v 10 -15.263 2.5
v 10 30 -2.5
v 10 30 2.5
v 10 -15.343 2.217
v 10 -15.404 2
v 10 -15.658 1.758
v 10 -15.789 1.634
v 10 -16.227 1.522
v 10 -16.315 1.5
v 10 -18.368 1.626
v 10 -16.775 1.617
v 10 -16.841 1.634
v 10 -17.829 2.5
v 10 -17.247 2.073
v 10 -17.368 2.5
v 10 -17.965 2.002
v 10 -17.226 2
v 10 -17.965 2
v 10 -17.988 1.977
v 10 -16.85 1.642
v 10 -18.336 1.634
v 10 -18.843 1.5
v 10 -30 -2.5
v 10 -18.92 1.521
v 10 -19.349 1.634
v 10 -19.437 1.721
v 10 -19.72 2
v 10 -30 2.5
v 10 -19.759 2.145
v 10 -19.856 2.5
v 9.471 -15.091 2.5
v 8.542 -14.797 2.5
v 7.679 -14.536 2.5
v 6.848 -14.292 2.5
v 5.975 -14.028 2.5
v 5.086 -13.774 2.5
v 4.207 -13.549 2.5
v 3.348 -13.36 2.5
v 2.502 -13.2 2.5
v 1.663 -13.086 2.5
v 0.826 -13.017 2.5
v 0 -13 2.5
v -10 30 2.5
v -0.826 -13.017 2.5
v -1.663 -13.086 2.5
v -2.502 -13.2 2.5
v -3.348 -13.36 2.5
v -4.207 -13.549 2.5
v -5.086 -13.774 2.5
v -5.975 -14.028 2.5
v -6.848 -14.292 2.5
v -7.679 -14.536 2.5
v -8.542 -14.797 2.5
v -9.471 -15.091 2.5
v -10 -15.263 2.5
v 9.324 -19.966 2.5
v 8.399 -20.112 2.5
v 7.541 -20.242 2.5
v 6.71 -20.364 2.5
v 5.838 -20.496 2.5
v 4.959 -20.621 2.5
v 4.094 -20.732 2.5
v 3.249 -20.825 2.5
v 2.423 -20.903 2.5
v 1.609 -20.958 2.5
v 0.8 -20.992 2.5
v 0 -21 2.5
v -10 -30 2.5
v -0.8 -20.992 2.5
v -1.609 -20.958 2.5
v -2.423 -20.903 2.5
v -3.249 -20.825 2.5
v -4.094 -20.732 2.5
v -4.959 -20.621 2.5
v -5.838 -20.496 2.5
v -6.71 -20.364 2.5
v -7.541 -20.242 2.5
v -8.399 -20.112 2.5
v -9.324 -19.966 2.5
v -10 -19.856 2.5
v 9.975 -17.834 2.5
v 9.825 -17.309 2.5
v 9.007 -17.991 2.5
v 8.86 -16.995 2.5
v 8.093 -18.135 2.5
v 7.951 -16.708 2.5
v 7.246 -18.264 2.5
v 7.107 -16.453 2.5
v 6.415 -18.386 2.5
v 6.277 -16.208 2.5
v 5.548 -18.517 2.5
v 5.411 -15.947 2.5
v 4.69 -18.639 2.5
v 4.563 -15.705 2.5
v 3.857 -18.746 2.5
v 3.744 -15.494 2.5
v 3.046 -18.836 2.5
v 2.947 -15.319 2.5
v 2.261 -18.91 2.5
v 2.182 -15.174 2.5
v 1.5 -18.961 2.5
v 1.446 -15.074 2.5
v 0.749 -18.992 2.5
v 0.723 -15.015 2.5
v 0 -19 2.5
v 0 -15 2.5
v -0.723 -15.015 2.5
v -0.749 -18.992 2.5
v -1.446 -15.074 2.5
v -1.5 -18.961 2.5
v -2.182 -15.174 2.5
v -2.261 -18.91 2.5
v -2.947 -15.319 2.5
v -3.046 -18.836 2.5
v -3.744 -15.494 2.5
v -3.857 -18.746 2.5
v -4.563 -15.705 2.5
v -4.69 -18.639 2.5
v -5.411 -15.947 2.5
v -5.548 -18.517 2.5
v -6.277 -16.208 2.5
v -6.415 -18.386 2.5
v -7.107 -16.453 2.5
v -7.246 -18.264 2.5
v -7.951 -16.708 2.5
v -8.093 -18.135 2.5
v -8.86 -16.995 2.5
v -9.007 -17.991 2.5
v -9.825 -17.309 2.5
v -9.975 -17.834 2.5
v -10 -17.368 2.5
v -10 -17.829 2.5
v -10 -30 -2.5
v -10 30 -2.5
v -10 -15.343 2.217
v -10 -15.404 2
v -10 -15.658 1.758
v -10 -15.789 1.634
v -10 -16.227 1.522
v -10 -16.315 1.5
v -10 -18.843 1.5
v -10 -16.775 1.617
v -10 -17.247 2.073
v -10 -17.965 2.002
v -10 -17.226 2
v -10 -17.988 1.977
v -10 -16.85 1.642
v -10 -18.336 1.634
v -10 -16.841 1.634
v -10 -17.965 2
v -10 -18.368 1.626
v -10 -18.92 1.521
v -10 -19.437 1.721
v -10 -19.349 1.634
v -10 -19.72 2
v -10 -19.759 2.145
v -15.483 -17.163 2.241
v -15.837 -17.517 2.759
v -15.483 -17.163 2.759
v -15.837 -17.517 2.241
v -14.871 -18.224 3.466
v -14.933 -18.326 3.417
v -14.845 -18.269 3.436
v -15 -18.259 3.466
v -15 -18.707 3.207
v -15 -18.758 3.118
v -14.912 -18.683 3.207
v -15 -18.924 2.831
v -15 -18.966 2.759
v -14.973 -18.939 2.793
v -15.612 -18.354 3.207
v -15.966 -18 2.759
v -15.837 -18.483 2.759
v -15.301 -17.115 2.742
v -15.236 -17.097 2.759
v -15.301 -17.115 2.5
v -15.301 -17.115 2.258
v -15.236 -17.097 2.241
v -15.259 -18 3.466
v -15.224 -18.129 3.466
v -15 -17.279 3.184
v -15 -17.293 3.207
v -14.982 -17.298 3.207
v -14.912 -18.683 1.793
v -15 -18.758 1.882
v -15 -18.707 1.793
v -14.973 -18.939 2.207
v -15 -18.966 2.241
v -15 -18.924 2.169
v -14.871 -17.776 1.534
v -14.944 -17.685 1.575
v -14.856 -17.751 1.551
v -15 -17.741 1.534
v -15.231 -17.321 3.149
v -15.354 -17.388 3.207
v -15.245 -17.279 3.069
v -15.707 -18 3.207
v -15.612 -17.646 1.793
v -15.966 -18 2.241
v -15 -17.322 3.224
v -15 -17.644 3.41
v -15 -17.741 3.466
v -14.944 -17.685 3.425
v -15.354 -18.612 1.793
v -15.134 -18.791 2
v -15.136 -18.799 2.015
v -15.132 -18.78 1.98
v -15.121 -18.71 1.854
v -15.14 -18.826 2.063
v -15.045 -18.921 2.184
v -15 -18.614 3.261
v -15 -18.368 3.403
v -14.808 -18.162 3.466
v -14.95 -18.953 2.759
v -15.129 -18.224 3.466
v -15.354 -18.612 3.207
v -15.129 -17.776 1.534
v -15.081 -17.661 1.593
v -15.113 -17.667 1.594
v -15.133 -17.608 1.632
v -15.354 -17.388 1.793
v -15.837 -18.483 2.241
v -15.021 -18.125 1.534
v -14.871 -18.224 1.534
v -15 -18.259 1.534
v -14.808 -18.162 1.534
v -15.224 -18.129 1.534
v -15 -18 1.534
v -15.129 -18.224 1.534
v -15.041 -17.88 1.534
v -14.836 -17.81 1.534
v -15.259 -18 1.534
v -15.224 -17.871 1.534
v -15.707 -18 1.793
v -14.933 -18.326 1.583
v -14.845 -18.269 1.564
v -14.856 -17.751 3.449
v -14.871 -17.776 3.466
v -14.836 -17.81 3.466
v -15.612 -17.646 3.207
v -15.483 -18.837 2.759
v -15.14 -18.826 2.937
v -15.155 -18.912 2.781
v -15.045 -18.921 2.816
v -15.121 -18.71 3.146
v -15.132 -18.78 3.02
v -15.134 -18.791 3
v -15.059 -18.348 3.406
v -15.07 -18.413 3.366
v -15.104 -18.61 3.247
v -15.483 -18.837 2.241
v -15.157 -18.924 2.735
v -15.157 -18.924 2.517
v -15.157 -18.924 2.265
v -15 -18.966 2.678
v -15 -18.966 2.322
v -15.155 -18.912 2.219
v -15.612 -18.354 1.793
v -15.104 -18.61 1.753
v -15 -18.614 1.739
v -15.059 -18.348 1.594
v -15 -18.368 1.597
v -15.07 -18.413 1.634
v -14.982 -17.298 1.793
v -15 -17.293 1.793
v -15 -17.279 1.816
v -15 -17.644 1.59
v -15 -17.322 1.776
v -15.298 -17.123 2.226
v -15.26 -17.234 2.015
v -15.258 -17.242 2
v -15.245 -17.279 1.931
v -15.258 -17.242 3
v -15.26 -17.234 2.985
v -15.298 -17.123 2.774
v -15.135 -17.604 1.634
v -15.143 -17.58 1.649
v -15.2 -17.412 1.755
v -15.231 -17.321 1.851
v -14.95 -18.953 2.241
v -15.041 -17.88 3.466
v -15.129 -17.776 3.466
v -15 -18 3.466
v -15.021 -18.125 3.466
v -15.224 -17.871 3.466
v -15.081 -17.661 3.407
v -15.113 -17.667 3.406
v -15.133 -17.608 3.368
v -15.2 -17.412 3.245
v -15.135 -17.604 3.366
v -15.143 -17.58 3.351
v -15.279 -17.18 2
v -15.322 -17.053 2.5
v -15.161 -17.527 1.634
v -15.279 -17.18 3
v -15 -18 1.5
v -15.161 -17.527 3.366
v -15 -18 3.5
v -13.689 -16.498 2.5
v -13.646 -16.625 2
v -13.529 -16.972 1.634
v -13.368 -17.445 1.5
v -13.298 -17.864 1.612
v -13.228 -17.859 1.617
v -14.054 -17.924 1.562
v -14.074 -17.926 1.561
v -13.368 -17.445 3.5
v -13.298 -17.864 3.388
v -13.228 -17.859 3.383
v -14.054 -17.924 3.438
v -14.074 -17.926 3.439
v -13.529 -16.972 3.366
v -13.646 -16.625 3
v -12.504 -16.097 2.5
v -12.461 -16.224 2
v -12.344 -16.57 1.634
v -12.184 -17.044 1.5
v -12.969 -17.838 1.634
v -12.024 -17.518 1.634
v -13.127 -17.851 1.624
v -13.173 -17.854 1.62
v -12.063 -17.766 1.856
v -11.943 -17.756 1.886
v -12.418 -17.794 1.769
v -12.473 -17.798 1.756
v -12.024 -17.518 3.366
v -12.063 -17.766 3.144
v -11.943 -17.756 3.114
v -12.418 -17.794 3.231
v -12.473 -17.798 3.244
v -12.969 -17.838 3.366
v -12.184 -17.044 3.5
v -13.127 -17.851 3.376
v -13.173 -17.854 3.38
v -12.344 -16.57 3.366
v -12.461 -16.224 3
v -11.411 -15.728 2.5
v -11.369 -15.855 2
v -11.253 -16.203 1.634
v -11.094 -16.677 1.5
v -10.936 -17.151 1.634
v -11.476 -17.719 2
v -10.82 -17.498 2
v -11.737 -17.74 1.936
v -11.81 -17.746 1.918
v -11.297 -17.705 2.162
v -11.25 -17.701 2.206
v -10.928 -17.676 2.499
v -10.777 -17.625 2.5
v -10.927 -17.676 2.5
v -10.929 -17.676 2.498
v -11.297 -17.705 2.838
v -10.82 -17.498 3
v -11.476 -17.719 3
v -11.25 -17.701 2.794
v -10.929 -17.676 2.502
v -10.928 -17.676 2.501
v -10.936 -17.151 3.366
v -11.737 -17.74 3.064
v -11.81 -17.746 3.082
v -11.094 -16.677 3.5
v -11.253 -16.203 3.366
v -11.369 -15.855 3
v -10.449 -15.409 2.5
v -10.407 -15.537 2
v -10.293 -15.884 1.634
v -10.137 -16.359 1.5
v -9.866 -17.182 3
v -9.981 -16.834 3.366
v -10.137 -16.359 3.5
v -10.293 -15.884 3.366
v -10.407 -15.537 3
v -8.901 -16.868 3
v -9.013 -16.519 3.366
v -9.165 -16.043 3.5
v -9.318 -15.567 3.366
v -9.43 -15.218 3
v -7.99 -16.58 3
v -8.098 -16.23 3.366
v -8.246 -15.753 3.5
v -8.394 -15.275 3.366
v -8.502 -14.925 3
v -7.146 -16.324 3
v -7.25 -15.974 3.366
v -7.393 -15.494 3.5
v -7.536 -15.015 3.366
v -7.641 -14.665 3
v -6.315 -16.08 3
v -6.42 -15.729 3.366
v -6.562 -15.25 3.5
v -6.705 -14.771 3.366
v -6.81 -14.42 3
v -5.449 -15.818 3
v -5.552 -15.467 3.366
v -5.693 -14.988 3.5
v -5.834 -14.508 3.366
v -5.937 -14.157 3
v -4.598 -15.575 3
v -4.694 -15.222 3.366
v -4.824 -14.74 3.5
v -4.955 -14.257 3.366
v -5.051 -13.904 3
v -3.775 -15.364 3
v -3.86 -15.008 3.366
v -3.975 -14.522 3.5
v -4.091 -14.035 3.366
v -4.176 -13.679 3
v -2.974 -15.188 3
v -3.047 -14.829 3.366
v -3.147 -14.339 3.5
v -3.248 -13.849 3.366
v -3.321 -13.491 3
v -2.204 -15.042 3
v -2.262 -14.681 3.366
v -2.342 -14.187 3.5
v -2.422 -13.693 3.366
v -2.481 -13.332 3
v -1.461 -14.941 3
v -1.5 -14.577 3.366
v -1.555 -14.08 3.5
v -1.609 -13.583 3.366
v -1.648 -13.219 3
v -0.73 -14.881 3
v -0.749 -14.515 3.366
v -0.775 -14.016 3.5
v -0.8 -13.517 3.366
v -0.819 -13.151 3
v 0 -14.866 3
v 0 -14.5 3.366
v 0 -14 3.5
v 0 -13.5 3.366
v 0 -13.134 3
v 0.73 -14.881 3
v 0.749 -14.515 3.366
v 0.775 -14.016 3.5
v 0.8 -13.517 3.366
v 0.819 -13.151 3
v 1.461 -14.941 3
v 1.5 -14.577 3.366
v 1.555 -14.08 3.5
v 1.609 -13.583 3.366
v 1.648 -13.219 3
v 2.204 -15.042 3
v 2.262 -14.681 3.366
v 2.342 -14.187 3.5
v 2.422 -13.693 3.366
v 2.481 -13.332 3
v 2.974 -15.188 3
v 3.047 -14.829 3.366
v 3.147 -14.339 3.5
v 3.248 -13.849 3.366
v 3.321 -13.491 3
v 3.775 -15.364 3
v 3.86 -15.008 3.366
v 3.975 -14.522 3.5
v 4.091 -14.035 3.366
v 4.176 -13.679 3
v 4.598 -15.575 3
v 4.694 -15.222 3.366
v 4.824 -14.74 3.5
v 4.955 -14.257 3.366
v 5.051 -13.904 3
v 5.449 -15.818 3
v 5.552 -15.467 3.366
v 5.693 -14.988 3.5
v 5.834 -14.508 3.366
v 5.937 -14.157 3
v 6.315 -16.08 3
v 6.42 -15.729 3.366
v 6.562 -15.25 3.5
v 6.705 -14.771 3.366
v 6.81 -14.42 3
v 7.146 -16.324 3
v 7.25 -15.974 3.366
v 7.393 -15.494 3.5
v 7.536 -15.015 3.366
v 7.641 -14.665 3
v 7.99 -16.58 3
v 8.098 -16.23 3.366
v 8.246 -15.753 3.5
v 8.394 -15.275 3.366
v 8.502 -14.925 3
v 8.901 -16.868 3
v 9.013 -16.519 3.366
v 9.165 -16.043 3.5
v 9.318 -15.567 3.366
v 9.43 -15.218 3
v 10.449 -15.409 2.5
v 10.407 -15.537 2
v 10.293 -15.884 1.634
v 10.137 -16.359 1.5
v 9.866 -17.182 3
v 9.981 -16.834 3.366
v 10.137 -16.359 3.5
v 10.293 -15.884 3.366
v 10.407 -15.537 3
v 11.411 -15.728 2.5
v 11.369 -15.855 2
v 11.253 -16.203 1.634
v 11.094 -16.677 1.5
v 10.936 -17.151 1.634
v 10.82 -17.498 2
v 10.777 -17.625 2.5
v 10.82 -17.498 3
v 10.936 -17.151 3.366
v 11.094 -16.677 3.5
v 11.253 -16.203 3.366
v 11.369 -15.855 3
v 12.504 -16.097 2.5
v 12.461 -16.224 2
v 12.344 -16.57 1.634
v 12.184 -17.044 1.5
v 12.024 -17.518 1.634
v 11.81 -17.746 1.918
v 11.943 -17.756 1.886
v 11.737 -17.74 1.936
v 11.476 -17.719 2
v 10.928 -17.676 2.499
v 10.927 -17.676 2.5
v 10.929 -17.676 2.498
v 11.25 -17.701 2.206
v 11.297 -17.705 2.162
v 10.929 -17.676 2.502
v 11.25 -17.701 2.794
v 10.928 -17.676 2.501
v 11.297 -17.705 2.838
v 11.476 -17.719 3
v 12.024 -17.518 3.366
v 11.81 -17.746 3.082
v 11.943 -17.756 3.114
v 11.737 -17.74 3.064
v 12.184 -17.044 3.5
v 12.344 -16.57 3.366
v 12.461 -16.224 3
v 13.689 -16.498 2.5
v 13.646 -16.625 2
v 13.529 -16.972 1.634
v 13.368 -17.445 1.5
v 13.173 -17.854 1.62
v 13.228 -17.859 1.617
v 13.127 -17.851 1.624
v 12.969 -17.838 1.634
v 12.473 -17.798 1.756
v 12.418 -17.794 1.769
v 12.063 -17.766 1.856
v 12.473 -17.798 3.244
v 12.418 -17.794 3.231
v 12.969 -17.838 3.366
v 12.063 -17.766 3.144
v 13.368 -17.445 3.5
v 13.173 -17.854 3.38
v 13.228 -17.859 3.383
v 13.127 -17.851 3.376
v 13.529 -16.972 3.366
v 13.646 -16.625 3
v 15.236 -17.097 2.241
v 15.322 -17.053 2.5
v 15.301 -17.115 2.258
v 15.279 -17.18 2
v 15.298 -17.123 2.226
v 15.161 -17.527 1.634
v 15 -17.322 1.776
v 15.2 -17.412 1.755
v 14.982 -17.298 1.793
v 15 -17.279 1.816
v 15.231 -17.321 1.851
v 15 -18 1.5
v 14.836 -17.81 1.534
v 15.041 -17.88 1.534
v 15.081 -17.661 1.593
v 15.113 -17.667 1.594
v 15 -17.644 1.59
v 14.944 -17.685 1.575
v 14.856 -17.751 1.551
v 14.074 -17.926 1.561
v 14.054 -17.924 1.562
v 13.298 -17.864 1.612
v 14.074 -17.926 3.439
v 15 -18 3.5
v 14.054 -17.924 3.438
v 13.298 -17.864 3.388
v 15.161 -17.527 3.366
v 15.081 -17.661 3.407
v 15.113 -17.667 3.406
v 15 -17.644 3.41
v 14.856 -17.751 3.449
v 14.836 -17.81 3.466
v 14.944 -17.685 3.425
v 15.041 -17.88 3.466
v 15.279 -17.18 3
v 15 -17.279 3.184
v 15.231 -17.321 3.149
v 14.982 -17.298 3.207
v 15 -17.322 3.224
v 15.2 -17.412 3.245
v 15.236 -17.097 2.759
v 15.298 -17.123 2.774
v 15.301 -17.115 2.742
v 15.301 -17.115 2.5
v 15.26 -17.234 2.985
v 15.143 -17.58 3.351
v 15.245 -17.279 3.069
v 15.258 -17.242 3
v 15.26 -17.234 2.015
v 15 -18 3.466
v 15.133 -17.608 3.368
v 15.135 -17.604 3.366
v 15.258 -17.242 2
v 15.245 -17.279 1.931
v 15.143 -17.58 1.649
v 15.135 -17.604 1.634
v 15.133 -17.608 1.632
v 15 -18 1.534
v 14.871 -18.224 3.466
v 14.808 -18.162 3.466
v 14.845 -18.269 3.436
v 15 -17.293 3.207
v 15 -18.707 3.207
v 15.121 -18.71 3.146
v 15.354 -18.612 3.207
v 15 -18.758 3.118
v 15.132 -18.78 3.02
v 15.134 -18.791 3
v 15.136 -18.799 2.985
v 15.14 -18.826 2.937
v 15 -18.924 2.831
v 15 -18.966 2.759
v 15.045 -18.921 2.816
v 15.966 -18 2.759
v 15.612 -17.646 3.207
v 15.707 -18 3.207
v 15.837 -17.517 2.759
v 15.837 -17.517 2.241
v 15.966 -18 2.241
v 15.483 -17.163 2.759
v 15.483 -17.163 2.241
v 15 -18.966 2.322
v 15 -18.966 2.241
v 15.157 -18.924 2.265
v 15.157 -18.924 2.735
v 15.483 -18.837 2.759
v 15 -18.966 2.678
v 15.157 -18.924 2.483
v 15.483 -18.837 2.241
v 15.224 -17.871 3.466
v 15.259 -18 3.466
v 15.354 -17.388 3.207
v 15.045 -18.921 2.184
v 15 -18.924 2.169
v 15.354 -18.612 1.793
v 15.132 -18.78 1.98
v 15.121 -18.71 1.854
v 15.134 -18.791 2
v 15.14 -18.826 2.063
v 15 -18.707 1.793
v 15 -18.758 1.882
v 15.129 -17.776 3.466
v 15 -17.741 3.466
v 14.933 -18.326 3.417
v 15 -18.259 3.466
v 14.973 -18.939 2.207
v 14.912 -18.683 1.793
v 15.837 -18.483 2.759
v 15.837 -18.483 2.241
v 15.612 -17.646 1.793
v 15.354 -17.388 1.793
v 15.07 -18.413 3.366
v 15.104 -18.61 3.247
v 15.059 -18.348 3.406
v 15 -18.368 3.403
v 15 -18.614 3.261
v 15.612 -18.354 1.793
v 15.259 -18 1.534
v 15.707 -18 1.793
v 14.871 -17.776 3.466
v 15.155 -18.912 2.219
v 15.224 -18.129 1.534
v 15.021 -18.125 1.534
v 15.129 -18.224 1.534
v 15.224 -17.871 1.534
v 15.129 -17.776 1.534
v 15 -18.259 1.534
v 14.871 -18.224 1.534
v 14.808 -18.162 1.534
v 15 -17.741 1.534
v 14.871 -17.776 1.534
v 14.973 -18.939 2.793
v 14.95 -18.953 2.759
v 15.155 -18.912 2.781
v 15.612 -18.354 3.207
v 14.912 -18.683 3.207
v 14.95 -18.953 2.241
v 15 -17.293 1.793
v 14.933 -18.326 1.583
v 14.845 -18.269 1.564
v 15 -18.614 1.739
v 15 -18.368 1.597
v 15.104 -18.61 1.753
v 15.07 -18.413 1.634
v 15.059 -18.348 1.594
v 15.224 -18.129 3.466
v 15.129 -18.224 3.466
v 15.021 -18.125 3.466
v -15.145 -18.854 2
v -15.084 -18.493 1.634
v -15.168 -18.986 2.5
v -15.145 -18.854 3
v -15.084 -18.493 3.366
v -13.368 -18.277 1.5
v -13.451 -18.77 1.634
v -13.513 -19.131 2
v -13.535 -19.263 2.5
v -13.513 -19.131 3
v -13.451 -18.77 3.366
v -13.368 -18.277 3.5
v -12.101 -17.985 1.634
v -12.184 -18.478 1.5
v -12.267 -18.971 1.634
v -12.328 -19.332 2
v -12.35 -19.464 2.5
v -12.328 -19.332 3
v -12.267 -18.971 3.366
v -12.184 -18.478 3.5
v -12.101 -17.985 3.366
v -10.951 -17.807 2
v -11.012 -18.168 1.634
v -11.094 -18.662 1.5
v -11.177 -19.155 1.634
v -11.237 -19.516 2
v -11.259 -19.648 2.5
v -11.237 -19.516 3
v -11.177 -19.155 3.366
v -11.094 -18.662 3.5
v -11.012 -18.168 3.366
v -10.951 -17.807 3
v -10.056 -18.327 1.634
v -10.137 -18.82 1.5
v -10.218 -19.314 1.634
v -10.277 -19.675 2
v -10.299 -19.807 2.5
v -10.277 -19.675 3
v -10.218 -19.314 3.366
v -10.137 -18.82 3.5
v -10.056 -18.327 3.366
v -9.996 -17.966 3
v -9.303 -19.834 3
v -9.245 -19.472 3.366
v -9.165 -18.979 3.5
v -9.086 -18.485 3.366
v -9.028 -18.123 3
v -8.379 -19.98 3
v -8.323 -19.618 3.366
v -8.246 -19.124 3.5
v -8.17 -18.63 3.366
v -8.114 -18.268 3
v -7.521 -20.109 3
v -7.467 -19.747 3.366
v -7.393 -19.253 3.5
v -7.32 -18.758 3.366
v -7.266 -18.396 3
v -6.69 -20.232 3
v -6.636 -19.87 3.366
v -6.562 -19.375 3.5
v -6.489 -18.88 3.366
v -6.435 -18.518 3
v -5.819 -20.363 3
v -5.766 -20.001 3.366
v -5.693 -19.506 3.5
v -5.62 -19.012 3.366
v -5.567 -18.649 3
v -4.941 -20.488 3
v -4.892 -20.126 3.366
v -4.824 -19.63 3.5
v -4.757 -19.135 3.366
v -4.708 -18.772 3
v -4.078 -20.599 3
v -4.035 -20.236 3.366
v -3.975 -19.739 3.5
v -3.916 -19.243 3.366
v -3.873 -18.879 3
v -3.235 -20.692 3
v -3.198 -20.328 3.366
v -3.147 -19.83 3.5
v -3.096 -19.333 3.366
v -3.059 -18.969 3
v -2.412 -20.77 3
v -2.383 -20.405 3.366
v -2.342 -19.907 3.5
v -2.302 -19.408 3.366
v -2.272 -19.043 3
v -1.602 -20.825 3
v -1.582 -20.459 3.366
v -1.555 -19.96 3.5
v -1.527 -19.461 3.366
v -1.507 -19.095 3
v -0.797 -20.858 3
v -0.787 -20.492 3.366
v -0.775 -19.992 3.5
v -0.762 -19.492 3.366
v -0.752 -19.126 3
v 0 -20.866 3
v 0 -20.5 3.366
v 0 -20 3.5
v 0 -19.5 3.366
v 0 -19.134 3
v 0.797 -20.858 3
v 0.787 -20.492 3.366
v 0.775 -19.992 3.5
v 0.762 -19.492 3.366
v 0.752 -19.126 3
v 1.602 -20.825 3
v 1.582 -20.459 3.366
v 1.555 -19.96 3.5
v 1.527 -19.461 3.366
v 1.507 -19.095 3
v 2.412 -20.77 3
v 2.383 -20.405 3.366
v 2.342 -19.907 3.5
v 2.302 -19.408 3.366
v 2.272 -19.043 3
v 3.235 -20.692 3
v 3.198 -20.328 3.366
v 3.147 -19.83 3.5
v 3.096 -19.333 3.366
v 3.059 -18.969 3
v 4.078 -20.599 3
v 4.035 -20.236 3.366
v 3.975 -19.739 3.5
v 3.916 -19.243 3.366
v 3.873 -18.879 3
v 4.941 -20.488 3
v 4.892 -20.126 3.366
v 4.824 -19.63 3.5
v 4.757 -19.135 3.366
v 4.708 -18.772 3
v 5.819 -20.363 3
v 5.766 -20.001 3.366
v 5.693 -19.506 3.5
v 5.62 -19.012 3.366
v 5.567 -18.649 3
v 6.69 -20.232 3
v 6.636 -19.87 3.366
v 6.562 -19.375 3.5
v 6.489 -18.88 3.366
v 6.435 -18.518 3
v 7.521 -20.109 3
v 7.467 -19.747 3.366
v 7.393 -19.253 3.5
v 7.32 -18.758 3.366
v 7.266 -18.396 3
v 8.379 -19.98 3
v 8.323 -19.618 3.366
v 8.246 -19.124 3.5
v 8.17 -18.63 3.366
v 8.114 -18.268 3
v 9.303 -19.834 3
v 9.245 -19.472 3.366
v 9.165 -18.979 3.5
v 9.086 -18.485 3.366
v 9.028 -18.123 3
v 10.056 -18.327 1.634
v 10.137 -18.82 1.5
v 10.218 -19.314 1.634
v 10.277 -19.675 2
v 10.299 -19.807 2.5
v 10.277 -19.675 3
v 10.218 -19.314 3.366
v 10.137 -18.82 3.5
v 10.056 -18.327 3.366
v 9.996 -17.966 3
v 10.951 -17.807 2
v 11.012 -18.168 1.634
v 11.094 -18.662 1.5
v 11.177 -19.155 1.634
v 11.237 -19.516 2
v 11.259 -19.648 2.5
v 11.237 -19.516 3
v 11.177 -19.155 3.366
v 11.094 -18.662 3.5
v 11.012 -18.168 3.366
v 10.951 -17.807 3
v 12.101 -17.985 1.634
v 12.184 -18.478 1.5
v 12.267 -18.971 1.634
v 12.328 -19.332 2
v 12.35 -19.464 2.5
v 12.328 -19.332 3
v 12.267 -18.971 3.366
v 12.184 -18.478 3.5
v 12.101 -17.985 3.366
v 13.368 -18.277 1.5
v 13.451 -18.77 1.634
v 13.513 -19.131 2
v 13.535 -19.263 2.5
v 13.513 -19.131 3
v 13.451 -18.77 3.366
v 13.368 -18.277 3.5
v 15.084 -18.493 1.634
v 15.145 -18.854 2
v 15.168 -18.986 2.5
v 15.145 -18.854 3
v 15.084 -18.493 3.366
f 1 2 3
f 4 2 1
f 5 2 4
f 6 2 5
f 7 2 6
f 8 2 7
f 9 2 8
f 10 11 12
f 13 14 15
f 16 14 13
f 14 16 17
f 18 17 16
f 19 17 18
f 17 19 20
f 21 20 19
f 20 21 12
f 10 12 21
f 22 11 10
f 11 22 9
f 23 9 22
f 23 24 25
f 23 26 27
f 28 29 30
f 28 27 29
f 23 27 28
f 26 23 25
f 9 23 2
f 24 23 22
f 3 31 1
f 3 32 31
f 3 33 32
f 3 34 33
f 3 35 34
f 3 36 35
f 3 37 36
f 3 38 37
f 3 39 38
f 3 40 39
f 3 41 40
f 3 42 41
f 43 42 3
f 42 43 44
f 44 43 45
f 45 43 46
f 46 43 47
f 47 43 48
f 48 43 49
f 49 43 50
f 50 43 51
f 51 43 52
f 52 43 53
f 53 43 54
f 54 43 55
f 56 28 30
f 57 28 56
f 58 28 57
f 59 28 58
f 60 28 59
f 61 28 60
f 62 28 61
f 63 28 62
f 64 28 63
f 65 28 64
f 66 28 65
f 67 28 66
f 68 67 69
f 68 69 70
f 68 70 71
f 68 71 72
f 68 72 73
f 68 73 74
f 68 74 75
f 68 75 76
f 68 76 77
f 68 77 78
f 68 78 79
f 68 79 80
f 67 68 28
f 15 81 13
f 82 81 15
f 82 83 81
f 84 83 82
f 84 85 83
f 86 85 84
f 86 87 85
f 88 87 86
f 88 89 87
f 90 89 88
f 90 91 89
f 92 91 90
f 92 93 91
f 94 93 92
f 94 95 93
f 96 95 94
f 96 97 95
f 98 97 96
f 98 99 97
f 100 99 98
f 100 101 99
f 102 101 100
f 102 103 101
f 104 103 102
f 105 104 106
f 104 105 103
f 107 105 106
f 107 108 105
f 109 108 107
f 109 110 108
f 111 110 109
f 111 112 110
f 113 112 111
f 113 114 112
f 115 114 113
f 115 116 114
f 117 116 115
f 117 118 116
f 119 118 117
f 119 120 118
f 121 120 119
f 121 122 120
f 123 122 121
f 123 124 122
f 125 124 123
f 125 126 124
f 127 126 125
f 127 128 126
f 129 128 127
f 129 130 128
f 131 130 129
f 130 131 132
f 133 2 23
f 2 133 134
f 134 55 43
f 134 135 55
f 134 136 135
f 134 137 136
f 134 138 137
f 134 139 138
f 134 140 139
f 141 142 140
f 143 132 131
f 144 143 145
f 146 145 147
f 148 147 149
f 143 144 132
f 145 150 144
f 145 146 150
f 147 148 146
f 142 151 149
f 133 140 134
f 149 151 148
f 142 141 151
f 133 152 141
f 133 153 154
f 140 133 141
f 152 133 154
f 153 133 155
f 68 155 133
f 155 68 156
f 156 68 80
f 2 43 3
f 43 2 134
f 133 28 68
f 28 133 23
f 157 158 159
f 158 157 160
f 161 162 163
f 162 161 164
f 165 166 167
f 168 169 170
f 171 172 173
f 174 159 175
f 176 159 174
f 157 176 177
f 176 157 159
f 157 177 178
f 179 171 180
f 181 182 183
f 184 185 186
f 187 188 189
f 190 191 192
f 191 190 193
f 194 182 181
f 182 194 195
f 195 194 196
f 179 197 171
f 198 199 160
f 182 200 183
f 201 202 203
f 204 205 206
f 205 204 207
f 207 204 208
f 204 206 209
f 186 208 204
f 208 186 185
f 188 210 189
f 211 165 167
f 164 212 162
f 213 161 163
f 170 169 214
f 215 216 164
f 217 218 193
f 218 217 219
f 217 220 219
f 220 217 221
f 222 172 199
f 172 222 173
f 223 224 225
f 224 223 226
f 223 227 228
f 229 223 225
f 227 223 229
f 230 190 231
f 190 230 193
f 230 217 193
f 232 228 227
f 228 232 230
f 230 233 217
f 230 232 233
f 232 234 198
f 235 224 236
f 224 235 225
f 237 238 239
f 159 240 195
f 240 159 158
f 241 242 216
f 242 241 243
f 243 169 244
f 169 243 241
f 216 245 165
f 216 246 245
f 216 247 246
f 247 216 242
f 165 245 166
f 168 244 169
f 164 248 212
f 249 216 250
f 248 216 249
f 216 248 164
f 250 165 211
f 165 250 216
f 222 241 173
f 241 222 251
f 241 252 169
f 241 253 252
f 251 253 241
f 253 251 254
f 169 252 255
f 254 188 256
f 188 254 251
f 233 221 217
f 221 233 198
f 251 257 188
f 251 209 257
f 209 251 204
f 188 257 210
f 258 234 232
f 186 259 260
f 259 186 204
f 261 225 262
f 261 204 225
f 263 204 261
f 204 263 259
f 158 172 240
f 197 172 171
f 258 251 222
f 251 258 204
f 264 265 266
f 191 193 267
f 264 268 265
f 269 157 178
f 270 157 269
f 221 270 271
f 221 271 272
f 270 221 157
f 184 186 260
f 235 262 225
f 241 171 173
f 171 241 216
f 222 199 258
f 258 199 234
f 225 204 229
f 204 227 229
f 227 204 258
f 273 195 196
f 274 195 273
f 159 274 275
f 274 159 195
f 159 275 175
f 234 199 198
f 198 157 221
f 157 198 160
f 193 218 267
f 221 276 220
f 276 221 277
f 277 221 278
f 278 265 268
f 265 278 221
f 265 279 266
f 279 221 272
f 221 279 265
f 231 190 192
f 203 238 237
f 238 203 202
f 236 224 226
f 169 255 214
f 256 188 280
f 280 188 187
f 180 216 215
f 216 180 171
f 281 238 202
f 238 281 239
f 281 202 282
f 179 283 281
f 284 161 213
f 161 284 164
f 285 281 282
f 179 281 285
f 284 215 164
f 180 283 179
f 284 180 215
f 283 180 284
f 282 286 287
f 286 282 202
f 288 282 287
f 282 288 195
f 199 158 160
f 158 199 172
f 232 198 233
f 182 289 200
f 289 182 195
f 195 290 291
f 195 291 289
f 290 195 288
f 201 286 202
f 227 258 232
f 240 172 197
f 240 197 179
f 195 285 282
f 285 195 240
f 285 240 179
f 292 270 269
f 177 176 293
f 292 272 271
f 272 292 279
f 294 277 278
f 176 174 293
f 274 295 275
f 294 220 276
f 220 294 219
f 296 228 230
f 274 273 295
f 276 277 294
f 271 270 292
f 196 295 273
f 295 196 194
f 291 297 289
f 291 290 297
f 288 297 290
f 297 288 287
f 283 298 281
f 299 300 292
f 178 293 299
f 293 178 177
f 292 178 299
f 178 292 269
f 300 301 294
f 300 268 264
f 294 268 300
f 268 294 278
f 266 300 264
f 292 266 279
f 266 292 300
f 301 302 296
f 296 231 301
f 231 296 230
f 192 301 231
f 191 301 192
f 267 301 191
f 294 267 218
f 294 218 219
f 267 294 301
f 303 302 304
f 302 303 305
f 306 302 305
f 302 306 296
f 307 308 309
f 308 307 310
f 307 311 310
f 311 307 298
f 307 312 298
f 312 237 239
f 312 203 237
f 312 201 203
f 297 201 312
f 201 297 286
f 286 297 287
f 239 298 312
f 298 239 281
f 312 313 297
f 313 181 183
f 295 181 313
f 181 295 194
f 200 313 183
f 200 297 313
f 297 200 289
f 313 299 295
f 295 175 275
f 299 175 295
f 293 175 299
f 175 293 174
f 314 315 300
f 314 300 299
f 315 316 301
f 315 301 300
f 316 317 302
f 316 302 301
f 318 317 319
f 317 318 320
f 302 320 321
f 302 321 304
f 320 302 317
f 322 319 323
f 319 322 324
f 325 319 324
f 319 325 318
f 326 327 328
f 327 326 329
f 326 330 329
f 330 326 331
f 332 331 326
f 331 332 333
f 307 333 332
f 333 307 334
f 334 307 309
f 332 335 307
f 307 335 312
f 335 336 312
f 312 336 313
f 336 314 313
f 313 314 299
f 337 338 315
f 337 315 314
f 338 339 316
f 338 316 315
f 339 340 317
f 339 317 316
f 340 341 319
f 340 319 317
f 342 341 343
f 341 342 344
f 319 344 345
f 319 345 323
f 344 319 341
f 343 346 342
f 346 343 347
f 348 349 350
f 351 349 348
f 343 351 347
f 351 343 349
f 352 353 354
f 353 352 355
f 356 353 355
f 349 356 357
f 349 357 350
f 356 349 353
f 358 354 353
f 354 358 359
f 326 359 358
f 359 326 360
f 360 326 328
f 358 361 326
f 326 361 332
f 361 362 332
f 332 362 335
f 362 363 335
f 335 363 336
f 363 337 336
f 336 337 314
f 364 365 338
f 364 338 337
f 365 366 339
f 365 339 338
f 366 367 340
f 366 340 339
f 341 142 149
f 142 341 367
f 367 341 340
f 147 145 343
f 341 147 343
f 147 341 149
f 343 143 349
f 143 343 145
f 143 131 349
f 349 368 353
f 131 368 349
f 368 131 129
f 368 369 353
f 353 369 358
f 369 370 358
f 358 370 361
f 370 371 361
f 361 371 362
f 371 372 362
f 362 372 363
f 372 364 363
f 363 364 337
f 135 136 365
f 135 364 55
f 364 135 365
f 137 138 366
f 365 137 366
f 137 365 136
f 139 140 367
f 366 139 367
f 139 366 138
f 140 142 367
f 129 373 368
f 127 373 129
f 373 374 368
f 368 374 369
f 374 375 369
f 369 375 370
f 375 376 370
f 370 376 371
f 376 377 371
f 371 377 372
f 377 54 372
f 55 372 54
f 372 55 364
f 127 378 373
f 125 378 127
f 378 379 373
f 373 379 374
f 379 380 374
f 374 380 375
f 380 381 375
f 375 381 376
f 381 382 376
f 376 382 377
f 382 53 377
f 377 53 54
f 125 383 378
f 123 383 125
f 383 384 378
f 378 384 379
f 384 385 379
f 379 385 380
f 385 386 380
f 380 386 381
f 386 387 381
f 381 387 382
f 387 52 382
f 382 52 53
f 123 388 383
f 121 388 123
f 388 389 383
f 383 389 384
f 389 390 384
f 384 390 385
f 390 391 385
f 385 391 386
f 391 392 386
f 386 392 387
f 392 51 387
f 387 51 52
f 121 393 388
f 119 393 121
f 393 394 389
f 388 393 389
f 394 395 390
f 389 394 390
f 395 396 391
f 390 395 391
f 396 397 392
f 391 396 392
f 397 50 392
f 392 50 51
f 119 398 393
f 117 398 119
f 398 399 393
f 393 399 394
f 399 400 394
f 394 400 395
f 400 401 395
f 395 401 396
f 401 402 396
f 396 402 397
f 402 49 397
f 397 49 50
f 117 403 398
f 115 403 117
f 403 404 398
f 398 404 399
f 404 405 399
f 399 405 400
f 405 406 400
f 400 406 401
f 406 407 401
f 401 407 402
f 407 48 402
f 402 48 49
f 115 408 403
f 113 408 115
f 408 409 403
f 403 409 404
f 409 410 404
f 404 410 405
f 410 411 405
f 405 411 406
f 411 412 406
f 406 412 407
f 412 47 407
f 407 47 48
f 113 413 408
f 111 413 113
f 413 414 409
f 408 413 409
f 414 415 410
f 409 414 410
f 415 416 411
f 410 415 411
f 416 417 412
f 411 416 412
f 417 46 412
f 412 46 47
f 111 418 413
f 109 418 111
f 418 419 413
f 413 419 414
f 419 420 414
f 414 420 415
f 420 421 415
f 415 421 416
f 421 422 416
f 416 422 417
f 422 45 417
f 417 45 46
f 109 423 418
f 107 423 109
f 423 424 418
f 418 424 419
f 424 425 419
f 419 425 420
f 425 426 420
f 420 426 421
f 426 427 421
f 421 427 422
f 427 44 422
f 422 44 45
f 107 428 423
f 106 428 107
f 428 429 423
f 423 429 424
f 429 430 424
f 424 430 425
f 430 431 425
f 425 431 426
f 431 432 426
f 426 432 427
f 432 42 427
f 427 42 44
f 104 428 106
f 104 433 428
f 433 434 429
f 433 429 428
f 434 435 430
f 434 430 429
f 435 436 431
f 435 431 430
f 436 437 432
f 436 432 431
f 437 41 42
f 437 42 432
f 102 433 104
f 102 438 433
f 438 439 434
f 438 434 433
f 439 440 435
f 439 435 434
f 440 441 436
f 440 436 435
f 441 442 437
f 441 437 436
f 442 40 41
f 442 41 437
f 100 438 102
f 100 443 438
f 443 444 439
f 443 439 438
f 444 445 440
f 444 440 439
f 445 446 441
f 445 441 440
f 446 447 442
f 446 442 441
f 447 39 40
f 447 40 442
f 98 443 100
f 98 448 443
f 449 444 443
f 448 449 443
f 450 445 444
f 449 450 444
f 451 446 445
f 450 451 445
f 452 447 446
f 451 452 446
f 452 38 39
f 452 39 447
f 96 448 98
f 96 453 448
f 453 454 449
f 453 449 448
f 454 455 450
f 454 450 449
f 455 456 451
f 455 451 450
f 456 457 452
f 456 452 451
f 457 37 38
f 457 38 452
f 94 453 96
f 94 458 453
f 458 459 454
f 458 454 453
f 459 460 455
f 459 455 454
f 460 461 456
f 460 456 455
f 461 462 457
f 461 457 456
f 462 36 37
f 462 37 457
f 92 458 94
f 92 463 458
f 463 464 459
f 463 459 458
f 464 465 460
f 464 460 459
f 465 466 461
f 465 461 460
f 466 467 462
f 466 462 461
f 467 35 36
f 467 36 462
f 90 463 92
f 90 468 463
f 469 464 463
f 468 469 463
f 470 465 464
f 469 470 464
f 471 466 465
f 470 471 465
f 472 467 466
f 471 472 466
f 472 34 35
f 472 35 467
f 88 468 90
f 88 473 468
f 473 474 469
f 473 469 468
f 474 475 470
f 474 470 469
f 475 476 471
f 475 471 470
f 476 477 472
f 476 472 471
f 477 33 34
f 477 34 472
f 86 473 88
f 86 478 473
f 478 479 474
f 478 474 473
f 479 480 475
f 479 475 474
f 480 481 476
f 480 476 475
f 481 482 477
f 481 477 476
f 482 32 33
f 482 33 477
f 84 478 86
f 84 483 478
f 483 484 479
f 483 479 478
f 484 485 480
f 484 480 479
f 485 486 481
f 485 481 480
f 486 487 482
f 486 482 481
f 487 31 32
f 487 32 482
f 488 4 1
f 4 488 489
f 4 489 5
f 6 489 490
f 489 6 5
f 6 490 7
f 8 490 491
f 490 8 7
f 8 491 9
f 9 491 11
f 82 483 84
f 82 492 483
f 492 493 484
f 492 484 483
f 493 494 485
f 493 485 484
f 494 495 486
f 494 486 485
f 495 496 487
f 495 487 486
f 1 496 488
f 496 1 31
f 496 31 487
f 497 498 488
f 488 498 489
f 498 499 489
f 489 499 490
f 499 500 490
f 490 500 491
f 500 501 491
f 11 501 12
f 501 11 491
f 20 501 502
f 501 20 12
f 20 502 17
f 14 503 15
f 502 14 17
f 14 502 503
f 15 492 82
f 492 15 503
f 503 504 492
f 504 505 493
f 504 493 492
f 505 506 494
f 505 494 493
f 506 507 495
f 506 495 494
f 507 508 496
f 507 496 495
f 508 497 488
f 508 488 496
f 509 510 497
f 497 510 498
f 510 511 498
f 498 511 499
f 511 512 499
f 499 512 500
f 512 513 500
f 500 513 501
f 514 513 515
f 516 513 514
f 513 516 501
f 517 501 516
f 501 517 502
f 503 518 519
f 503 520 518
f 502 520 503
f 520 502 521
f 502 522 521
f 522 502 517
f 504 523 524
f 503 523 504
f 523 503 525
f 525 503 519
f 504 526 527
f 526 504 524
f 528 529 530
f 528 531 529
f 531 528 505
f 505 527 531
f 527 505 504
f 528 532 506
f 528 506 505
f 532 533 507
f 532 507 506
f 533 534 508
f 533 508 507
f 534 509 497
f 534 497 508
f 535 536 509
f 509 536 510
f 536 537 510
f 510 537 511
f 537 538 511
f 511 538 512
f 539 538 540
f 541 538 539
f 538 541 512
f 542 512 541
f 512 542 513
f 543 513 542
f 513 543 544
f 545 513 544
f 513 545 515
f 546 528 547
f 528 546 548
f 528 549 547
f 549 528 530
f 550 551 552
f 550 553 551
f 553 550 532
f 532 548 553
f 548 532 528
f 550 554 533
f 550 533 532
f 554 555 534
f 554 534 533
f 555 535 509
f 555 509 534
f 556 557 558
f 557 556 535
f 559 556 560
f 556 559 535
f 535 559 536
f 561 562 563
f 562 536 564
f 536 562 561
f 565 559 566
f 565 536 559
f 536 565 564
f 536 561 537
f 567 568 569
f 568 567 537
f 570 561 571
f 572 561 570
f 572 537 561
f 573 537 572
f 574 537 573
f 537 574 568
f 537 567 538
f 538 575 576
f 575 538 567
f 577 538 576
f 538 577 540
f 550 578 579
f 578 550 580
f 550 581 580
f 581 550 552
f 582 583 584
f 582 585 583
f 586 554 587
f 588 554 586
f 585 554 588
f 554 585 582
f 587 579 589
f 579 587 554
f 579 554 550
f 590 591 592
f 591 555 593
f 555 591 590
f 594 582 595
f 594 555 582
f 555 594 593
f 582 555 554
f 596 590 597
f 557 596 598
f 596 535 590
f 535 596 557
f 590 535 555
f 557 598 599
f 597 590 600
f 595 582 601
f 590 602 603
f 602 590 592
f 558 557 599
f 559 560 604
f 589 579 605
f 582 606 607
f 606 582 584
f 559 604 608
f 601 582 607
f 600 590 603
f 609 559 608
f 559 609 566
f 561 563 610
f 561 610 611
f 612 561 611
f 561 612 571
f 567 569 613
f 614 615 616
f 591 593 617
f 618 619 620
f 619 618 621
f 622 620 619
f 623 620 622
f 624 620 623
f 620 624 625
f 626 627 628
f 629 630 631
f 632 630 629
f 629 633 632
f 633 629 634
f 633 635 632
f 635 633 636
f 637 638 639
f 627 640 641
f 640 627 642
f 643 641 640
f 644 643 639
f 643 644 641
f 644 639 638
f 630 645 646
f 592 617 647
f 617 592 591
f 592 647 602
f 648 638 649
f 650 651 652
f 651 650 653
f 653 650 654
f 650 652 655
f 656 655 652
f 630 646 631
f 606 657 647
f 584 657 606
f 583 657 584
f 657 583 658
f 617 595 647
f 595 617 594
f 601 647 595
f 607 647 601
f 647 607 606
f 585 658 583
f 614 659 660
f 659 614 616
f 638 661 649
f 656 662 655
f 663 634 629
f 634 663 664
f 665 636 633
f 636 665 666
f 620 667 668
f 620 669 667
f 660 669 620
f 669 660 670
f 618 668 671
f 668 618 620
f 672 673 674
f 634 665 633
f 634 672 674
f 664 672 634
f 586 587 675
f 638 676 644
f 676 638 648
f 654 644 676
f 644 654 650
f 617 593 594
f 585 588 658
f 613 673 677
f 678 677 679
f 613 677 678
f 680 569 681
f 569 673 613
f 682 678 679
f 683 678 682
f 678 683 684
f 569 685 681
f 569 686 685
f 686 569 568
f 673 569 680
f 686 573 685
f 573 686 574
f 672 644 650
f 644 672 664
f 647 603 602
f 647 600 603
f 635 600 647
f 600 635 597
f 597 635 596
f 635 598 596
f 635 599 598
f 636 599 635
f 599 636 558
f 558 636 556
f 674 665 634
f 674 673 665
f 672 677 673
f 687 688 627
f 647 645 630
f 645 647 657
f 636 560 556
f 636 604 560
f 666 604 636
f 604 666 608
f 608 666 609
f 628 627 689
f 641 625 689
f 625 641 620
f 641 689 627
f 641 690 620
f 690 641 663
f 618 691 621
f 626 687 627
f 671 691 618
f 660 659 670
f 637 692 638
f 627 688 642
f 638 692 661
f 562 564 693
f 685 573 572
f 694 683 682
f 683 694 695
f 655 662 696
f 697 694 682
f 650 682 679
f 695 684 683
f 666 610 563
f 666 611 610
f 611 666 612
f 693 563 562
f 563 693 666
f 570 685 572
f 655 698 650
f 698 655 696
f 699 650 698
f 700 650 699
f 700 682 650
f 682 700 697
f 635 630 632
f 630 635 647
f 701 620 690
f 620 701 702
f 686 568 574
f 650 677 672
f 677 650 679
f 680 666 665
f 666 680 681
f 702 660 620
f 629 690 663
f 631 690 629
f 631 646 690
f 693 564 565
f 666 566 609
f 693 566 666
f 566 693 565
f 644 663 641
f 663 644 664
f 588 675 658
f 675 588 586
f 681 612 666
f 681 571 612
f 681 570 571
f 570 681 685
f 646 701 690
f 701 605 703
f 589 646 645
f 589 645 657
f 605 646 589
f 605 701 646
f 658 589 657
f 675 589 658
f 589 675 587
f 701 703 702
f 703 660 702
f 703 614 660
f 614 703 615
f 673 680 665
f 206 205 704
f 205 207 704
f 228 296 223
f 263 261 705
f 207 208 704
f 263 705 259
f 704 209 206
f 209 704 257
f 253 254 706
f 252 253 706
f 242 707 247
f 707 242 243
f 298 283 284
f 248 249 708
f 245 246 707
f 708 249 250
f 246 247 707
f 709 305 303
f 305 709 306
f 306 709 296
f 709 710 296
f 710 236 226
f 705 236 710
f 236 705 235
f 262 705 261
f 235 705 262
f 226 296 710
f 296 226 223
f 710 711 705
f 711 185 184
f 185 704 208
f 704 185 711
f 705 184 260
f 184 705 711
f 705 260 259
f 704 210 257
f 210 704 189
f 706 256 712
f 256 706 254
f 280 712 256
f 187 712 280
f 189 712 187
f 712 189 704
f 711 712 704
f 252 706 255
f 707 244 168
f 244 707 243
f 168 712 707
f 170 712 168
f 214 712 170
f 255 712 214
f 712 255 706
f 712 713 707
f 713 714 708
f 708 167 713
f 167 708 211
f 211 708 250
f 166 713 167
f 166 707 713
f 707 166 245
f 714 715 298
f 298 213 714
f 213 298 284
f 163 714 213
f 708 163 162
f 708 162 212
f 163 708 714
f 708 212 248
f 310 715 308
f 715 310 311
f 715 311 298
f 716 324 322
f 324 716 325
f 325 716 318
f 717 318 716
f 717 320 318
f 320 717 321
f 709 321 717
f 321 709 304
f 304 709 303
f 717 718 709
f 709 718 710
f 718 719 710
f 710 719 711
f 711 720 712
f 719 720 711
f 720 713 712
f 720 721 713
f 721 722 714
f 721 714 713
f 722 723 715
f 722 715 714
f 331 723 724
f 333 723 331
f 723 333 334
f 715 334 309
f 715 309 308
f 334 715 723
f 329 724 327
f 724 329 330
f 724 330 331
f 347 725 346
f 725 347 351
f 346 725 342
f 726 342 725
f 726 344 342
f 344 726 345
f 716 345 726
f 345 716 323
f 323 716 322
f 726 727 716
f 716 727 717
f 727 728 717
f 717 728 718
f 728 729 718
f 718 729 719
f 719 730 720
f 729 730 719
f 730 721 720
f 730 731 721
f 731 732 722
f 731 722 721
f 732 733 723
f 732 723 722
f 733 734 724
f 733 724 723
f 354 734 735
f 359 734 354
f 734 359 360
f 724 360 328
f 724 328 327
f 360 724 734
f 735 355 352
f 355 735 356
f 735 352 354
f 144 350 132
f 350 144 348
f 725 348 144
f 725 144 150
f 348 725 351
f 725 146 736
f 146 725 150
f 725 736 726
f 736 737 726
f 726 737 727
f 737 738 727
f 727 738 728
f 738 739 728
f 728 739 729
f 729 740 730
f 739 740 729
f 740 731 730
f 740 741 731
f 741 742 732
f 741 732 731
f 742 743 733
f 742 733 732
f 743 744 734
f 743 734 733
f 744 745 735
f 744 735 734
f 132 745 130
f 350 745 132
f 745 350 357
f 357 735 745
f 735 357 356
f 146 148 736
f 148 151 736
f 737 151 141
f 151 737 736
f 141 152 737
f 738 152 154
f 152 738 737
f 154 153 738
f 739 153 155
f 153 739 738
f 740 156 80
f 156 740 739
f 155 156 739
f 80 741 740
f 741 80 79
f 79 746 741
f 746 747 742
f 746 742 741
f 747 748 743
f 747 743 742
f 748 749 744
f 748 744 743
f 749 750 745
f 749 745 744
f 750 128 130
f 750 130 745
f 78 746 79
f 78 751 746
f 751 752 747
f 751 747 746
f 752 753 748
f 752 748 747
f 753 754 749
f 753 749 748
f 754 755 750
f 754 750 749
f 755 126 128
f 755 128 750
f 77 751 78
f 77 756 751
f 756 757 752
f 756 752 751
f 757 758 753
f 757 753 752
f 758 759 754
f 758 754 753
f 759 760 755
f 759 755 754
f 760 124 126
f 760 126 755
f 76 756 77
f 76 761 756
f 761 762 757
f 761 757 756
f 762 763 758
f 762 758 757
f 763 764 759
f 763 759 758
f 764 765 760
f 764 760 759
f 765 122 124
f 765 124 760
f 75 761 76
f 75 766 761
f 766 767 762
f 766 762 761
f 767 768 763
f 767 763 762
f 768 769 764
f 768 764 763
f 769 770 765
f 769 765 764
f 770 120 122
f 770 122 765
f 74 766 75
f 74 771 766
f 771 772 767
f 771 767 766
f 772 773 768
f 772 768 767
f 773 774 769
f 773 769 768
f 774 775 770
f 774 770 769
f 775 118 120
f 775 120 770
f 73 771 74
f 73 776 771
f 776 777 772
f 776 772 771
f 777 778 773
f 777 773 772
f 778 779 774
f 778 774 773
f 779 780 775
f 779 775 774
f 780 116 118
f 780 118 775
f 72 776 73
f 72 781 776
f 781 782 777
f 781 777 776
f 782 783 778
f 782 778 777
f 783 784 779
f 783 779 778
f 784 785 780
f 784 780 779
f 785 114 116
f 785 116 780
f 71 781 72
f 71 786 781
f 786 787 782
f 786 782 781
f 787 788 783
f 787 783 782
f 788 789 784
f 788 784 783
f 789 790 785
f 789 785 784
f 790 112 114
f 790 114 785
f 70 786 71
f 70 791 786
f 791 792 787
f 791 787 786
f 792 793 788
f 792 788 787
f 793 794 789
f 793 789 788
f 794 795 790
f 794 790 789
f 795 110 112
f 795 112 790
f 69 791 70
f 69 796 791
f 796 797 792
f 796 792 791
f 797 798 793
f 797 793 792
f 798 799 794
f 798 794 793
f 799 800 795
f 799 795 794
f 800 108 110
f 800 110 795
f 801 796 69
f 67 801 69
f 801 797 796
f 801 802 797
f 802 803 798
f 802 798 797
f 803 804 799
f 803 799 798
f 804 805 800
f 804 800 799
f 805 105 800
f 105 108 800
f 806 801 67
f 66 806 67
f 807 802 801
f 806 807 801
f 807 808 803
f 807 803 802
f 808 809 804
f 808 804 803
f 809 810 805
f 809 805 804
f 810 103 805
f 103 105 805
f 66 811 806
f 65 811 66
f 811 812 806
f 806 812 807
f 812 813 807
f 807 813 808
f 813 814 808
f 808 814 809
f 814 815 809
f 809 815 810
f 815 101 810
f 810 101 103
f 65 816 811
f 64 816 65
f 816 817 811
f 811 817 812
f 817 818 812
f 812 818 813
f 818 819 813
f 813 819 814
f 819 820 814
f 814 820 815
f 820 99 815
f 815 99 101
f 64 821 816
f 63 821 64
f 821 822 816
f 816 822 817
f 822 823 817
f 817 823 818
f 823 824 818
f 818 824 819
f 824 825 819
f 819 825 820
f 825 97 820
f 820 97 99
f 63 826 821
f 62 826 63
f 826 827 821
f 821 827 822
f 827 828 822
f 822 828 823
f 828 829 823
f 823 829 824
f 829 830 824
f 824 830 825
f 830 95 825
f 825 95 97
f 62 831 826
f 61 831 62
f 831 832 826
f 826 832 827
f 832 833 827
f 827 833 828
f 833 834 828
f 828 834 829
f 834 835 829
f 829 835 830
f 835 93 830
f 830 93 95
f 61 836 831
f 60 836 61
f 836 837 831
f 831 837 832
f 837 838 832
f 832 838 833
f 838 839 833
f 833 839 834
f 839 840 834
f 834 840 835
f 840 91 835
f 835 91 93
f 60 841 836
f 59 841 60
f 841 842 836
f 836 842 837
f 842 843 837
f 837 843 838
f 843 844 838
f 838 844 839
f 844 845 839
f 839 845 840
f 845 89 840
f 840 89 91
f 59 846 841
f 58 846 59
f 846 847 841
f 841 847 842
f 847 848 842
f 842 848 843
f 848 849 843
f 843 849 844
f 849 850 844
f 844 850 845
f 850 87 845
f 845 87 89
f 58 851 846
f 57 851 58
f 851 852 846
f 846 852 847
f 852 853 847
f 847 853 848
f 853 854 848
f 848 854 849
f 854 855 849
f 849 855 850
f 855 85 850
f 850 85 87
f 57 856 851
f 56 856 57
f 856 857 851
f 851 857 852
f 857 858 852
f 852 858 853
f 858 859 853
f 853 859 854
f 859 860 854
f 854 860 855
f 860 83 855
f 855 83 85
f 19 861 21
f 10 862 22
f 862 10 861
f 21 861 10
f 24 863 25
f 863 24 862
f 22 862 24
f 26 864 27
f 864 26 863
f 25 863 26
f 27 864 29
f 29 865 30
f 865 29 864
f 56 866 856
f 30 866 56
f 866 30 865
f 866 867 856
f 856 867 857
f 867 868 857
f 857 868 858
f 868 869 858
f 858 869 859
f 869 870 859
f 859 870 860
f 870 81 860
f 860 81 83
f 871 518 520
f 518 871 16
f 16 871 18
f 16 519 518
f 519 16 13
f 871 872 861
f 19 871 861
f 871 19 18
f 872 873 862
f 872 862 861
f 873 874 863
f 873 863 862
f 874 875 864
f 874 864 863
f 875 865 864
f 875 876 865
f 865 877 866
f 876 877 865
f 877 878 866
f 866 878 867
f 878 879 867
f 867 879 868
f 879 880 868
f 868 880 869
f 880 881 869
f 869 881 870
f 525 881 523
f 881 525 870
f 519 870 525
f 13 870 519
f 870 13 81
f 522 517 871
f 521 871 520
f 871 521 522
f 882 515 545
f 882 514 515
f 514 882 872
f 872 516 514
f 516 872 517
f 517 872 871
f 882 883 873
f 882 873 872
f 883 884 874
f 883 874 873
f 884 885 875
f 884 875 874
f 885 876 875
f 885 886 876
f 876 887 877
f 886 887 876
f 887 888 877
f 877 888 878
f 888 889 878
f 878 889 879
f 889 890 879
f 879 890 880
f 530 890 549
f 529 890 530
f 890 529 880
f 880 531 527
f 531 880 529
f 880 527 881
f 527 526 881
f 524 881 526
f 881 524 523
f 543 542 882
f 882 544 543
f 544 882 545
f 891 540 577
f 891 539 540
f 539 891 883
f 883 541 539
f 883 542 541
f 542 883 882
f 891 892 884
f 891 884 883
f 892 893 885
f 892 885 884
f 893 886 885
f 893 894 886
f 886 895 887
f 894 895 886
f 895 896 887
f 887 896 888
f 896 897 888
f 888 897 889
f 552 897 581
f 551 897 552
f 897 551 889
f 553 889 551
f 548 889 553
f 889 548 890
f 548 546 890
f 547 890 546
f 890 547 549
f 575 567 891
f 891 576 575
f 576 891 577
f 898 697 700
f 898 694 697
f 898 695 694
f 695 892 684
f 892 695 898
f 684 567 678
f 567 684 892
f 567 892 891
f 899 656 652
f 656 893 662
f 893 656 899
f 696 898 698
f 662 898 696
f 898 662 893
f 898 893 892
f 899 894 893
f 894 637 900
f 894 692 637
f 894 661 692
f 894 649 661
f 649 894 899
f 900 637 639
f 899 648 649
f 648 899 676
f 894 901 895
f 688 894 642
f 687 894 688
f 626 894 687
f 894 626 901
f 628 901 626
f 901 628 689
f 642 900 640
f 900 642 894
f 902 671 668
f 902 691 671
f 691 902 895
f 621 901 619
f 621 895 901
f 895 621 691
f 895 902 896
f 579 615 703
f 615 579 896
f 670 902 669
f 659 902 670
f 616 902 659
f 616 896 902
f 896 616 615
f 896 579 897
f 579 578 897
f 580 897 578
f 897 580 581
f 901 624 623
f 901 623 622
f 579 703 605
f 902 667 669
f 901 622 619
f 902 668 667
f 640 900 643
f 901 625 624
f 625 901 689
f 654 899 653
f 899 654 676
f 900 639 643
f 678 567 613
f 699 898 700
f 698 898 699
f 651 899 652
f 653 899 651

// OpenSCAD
// file: ../moves.scad
/* Convenience functions for more-readable translations and rotations.
  Where relative directions like "left" and "right" are used,
  they assume you're looking from the Front view in OpenSCAD (Ctrl+8), 
  which is looking down the Y axis with X pointing right and Z to the top of the screen.
*/

include <dfm.scad>

module move(x=0,y=0,z=0,rx=0,ry=0,rz=0)
{ 
  translate([x,y,z])
    rotate([rx,ry,rz]) 
      children(); 
}

module moveUp(x) {
  translate([0, 0, x])
    children();
}

module moveDown(x) {
  translate([0, 0, -x])
    children();
}

module moveLeft(x) {
  translate([-x, 0, 0])
    children();
}

module moveRight(x) {
  translate([x, 0, 0])
    children();
}

module moveBack(x) {
  translate([0, x, 0])
    children();
}

module moveForward(x) {
  translate([0, -x, 0])
    children();
}

module nudgeLeft() {
  moveLeft(EPSILON)
    children();
}
module nudgeRight() {
  moveRight(EPSILON)
    children();
}
module nudgeBack() {
  moveBack(EPSILON)
    children();
}
module nudgeForward() {
  moveForward(EPSILON)
    children();
}
module nudgeUp() {
  moveUp(EPSILON)
    children();
}
module nudgeDown() {
  moveDown(EPSILON)
    children();
}

module flipOver() {
  rotate([180, 0, 0])
    children();
}

module turnAround() {
  rotate([0, 0, 180])
    children();
}

module spin(angle) {
  rotate([0, 0, angle])
    children();
}

// I'm forever modeling things on the X-Y plane and then flipping them vertically around X.
module tipUp(angle=90) {
  rotate([angle, 0, 0])
    children();
}

module invert() {
  mirror([0, 0, 1])
    children();
}

// Trim functions: remove the area indicated by the name.
// Specifying the target size improves OpenSCAD display.
// Add an offset to move the trim line towards what's being trimmed;
// e.g. trimLower(offset=5) trims away from Z=-5 in the -Z direction.

module trimLower(size=HUGE, offset=0) {
  difference() {
    union() {
      children();
    }
    moveDown(size/2 + offset)
      cube([size, size, size], center=true);
  }
}

module trimUpper(size=HUGE, offset=0) {
  difference() {
    union() {
      children();
    }
    moveUp(size/2 + offset)
      cube([size, size, size], center=true);
  }
}

module trimRight(size=HUGE, offset=0) {
  difference() {
    union() {
      children();
    }
    moveRight(size/2 + offset)
      cube([size, size, size], center=true);
  }
}

module trimLeft(size=HUGE, offset=0) {
  difference() {
    union() {
      children();
    }
    moveLeft(size/2 + offset)
      cube([size, size, size], center=true);
  }
}

// Trims both right and left sides with the given offset.
// (Using an offset of 0 makes no sense - it would include nothing - so the default is not zero.)
module trimSides(size=HUGE, offset=5) {
  trimLeft(size, offset)
    trimRight(size, offset)
      children();
}

module trimBack(size=HUGE, offset=0) {
  difference() {
    union() {
      children();
    }
    moveBack(size/2 + offset)
      cube([size, size, size], center=true);
  }
}

module trimFront(size=HUGE, offset=0) {
  difference() {
    union() {
      children();
    }
    moveForward(size/2 + offset)
      cube([size, size, size], center=true);
  }
}

// Includes only the parts of the children that fit in the selected quadrant.
// q is a vector of sizes.
module includeQuadrant(q=[HUGE, HUGE, HUGE]) {
  intersection() {
    union() {
      children();
    }
    scale(q) {
      cube([1, 1, 1]);
    }
  }
}
// file: ../dfm.scad
/* Design For Manufacture (DFM) constants.
  Include it using: include <tjw-scad/dfm.scad>
  Use these to allow others to easily modify your designs to work well on their own printers,
  or to port your own designs to your next printer!
*/

// ===========================================================================
// Settings to customize per printer

// The size of the printer's nozzle.
NOZZLE = 0.50;

// The layer height setting you're using to print.
NOMINAL_LAYER = 0.2;

// The nominal height of the first layer printed, often different from the rest.
NOMINAL_FIRST_LAYER = 0.3;

// The steepest angle, in degrees from +Z, that your printer can print.
// The maximum overhang angle.
MAX_OVERHANG_ANGLE =
  //45;  // fairly conservative universal value
  60;  // not impossible if you have a layer fan and it hits the geometry well


// ===========================================================================
// Universal constants

// Use this to ensure that Boolean edges aren't coincident.
EPSILON = 0.01;
EPSILON2 = [EPSILON, EPSILON];
EPSILON3 = [EPSILON, EPSILON, EPSILON];

// Handy constant for when you want something big, and it doesn't matter how big.
// Often used in Boolean subtraction.
HUGE = 1000;

// The "Golden Ratio," AKA golden mean or divine proportion, 
// possibly overhyped but you could do worse as a relative size for nice forms.
GOLDEN = 1.618;

// Use like "THUMB = 1*inch;"
inch = 25.4;

PI = 3.1415629;

// ===========================================================================
// Derived settings that you may not need to customize

// Use this in calculations where you need something to be the minimum possible height.
SINGLE_LAYER = NOMINAL_LAYER + EPSILON;

// The first layer is usually thicker to promote good bonding with the build plate.
// So, if you something a single layer tall, and it's the bottom layer, use this.
FIRST_LAYER = NOMINAL_FIRST_LAYER + EPSILON;
// But that may not be enough to actually get it to appear from the slicer,
// so to produce a single first layer output, use this.
MIN_THICKNESS_FIRST_LAYER = NOMINAL_FIRST_LAYER;

// The minimum horizontal thickness for something to get printed - a vertical wall, e.g.
MIN_WALL_THICKNESS = NOZZLE * 1.04;
MIN_WALL_THICKNESS_FIRST_LAYER = NOZZLE + MIN_THICKNESS_FIRST_LAYER;

// If you want a dimension to be the same horizontally and vertically,
// this is the minimum thickness for printing.
MIN_THICKNESS = max(MIN_WALL_THICKNESS, MIN_THICKNESS_FIRST_LAYER, MIN_WALL_THICKNESS_FIRST_LAYER);

// This is the total delta between surfaces for different degrees of fit.
// The main constant in each group is sized for things that slide freely between two walls; 
// if you have something that is fixed in the middle between two walls, use _FIXED.
// And for structures that are fixed and have only one gap, use _SINGLE.
LOOSE_FIT = 1.2;  // Extra sloppy - for things that need some slack to insert.
LOOSE_FIT_FIXED = LOOSE_FIT + 0.2;
LOOSE_FIT_SINGLE = LOOSE_FIT / 2;

SLIDE_FIT = 0.6;  // Close enough to slide well without getting crooked.
SLIDE_FIT_FIXED = SLIDE_FIT * 2;
SLIDE_FIT_SINGLE = SLIDE_FIT / 2;

FRICTION_FIT = 0.4;  // Close enough to require some force, and then stick.
FRICTION_FIT_FIXED = 0.6;
FRICTION_FIT_SINGLE = 0.3;

// ===========================================================================
// Circles that need to rotate generally need more clearance,
// because of irregularities in different axes of the printer,
// and because of faceting in the model.

CIRCLE_FIT = 0.2;

LOOSE_CIRCLE_FIT = LOOSE_FIT + CIRCLE_FIT;
SLIDE_CIRCLE_FIT = SLIDE_FIT + CIRCLE_FIT;
FRICTION_CIRCLE_FIT = FRICTION_FIT + CIRCLE_FIT;

// ===========================================================================
// These are features of the material used.
// These settings are my general favorites for PLA.

// The thickness of something to be printed just for support.
SUPPORT_WIDTH = MIN_THICKNESS;

// A good thickness for something that should flex, but be strong.
// Ends up being a couple of layers at 0.2 mm layer height.
STRONG_FLEX = 0.45;

// A good minimum thickness for something that should be quite rigid.
RIGID_WALL = 1.2;
  
THICK_WALL = 2;
// main file
/* Mask from last night's dream.
*/

include <../dfm.scad>
include <../moves.scad>
use <../spline.scad>

HEIGHT = 5;

difference() {
  // head
  cube([20, 60, HEIGHT], center=true);

  // eyes
  translate([0, 20, HEIGHT/2])
    for (i = [-1 : 2 : 2])
      spline_sausage([[i*6, 1, 0], [i*5, 0, 0], [i*4, 1, 0]], diameter=2);

  // nose
  translate([0, 0, HEIGHT/2])
    spline_sausage([[0, 10, 0], [-3, -5, 0], [0, -5, 0]], diameter=2);
}

// mouth
translate([0, -18, HEIGHT/2]) {
  spline_sausage([[-15, 0, 0], [0, 4, 0], [15, 0, 0]], diameter=2);
  spline_sausage([[-15, 0, 0], [0, -2, 0], [15, 0, 0]], diameter=2);
}
